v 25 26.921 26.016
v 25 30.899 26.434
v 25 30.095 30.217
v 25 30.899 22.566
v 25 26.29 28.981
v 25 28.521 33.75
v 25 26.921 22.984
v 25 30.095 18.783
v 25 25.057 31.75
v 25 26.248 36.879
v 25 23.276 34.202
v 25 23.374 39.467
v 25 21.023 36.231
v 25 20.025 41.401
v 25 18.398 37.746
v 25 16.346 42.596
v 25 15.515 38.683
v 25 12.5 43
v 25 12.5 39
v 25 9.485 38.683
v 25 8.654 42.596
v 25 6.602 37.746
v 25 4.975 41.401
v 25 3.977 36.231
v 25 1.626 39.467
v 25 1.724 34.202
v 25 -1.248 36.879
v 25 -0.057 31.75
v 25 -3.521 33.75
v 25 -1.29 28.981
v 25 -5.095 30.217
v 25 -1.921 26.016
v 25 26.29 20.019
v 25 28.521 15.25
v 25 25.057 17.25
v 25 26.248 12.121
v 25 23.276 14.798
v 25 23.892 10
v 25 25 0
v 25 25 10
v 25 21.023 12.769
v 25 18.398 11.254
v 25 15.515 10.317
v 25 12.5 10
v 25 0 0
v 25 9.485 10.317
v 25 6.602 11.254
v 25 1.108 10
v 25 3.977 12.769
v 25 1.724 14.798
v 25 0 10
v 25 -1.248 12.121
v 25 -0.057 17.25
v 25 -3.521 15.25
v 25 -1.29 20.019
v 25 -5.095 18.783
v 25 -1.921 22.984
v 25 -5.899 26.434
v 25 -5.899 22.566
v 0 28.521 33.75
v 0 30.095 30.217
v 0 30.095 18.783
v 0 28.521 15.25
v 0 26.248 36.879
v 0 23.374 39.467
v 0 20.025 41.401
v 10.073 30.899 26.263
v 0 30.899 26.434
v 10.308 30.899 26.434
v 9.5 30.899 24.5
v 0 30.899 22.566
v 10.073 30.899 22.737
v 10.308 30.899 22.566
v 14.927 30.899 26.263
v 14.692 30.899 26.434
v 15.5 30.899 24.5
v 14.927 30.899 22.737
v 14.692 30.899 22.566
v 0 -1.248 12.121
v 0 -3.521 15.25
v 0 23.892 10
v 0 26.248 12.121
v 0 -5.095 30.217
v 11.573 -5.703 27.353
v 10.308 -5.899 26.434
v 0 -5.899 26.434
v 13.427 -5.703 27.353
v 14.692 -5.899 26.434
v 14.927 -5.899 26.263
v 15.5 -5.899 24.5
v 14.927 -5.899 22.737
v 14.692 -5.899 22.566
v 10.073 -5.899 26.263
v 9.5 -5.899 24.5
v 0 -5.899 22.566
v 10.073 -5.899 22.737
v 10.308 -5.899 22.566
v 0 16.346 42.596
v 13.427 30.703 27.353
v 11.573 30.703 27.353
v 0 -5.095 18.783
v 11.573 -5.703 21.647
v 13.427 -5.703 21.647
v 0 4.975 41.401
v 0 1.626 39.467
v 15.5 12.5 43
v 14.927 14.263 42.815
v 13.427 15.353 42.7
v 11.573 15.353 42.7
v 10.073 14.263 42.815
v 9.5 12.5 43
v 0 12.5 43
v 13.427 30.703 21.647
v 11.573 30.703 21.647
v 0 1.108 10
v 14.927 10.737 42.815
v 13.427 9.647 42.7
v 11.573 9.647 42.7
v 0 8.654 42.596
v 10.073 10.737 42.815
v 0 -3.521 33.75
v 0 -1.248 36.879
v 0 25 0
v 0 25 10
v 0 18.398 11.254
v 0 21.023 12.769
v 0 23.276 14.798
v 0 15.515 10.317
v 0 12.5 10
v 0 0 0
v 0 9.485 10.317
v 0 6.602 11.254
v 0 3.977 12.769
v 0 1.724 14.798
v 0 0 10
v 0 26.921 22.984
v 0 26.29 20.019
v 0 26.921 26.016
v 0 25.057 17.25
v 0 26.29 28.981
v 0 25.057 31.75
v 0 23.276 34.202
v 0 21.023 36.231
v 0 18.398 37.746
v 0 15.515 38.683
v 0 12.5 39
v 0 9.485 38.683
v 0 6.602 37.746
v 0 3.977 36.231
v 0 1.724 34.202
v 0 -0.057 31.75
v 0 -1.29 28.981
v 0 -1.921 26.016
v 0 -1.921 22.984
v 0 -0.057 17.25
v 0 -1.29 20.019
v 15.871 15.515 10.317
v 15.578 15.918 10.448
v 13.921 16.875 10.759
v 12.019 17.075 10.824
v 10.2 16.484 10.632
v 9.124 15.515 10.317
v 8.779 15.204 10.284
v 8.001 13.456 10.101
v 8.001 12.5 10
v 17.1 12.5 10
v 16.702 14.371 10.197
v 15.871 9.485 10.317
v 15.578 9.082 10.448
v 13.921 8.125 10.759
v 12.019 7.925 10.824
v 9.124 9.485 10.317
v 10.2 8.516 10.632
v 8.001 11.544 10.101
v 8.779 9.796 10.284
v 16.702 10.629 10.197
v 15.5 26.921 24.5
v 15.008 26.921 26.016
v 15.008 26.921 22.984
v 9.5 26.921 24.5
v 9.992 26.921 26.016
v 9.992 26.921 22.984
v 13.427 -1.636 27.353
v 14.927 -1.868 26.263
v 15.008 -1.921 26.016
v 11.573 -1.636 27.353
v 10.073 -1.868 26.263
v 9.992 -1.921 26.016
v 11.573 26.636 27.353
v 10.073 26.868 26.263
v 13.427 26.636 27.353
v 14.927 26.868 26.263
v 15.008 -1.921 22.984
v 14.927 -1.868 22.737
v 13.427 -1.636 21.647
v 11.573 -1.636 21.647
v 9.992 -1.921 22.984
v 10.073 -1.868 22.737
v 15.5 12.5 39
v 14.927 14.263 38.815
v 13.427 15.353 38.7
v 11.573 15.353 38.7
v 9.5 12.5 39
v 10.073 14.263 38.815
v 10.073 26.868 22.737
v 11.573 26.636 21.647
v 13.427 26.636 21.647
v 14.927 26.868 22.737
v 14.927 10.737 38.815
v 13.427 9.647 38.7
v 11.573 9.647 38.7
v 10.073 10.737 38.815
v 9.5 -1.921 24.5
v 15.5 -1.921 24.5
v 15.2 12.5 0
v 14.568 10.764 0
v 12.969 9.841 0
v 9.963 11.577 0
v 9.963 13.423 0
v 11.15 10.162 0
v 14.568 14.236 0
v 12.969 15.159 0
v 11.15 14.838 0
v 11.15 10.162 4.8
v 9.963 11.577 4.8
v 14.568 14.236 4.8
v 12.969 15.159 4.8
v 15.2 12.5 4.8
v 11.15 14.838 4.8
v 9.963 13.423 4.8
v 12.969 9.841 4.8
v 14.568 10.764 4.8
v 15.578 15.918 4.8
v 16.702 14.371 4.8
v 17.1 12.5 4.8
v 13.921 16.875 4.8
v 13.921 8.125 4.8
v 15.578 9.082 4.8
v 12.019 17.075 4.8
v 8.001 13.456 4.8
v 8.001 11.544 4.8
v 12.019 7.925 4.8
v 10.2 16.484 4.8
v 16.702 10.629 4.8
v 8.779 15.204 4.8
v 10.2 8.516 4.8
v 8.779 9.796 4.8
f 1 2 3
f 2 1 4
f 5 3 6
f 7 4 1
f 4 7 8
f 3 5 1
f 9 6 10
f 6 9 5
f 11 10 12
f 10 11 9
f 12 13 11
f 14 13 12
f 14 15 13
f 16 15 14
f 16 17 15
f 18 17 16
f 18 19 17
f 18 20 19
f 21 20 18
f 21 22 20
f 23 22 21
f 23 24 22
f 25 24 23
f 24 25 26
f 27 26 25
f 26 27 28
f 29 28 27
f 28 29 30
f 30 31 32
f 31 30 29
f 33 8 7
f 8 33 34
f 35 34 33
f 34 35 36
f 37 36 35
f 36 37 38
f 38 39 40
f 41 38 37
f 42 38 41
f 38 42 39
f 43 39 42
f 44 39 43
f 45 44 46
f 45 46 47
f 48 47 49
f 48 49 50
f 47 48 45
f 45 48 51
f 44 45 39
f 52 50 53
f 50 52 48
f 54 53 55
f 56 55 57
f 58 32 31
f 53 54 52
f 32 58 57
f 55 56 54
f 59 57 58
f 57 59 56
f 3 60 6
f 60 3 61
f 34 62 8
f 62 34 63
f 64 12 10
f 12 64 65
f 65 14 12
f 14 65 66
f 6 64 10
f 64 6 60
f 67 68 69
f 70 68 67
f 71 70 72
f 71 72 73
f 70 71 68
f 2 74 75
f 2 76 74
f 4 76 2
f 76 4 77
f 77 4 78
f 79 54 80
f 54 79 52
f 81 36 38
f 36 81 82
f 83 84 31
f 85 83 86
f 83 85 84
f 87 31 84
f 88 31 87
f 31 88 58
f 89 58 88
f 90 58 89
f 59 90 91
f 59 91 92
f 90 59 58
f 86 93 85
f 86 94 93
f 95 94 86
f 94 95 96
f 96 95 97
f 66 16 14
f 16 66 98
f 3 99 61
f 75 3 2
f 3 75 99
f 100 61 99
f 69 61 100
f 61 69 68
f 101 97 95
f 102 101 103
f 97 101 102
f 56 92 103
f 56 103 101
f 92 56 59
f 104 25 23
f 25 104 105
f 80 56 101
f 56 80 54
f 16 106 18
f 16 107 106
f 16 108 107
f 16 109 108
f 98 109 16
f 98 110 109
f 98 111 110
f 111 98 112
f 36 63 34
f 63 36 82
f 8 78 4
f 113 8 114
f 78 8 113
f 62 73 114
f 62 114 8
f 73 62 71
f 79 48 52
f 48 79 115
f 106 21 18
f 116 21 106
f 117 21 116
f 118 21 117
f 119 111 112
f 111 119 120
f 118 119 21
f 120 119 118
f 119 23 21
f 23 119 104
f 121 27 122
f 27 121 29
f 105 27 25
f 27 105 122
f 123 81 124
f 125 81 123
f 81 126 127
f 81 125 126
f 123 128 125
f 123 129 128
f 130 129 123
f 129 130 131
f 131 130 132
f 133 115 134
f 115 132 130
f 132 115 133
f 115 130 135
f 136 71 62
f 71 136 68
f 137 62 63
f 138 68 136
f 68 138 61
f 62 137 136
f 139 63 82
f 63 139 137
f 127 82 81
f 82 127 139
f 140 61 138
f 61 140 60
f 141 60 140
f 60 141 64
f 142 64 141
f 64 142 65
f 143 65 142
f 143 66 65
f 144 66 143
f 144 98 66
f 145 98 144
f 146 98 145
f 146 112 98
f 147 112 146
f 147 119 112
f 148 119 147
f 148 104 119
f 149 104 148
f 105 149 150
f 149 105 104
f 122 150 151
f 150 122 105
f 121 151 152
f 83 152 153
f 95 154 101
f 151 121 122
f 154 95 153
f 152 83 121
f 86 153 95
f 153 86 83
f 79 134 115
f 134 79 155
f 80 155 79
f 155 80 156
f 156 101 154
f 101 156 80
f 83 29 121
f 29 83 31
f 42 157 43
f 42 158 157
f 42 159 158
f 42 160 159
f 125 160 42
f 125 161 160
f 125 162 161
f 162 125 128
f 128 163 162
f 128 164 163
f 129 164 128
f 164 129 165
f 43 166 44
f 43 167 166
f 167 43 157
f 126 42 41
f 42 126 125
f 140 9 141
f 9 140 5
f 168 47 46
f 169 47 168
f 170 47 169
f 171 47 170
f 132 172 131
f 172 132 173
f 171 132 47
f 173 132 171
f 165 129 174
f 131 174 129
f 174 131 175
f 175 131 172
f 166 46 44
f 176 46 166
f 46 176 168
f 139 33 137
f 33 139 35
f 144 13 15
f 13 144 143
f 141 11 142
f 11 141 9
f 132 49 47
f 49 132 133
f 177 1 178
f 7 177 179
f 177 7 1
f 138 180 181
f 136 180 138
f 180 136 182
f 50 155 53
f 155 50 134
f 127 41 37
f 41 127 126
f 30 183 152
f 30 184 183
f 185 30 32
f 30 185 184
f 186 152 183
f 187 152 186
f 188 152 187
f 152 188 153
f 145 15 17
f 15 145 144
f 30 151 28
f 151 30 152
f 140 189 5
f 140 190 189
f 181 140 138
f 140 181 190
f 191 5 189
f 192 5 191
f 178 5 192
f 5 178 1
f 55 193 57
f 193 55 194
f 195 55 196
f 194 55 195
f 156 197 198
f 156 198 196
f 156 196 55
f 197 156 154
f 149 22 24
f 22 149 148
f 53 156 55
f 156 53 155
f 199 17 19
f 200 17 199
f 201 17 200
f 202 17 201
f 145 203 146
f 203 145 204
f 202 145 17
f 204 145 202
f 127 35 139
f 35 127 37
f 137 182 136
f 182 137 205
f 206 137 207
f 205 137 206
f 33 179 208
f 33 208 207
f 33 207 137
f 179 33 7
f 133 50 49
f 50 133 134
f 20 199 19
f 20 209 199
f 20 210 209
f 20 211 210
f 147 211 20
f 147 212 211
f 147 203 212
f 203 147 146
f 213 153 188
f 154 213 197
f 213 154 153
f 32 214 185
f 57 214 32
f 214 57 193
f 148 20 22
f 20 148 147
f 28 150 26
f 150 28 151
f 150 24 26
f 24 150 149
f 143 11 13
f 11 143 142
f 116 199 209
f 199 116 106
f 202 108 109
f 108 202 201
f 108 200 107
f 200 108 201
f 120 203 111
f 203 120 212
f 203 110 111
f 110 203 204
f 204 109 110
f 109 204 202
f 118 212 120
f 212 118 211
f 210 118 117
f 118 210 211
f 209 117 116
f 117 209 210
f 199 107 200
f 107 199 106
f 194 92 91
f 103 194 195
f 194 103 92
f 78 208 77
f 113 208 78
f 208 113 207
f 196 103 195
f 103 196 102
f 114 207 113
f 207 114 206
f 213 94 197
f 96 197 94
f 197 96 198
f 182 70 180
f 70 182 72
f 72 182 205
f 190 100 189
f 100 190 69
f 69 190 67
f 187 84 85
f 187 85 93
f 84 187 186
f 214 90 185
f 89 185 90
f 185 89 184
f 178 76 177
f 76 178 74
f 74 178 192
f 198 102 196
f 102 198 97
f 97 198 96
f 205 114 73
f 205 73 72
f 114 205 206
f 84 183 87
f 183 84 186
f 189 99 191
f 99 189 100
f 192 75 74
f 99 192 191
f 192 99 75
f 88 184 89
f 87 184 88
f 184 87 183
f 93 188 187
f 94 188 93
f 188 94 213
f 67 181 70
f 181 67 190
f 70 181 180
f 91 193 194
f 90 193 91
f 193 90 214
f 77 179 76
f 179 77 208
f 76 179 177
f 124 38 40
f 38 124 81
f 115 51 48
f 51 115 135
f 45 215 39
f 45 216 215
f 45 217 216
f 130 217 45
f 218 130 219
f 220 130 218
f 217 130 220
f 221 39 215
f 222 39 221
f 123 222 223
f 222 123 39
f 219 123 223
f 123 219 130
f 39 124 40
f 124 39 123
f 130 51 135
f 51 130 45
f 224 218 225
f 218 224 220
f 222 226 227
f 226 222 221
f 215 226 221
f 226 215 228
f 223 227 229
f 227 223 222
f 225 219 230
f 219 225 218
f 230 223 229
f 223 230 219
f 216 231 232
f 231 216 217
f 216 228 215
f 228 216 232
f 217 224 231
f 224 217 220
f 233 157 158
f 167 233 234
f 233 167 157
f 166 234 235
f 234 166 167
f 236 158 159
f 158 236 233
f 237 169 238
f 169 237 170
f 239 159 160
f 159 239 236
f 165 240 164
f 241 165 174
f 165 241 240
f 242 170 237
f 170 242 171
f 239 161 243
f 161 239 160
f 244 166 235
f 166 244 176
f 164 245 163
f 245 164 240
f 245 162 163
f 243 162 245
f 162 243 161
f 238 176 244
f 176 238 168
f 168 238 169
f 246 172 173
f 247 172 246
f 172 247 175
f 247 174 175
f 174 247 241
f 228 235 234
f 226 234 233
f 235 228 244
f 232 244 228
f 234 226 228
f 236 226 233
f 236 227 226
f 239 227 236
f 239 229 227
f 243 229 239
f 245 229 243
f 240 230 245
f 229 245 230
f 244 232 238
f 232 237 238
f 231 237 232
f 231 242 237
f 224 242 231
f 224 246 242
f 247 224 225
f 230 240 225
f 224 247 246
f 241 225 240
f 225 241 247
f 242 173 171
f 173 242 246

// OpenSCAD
base=25;
hole=29;
depth=25;
wall_thickness=4;
base_thickness=10;
hold_diameter=6;

screw_head_diameter=9.2;
screw_head_height=5.2;

difference() {
union() {
translate([(0)/2,base/2,hole/2+base_thickness])
rotate([0,90,0]) 
difference() {
    cylinder(r=hole/2+wall_thickness,h=depth);
    cylinder(r=hole/2,h=depth);
    translate([-(hole)/2-wall_thickness,0,depth/2]) 
    rotate([0,90,0]) 
    cylinder(r=hold_diameter/2,h=hole+(wall_thickness*2));
    translate([0,hole/2+wall_thickness,depth/2]) 
    rotate([90,90,0]) 
    cylinder(r=hold_diameter/2,h=hole+(wall_thickness*2));
};

difference() {
    cube([base,base,base_thickness]);
    translate([base/2,base/2,0]) cylinder(r=5.4/2,h=base_thickness);
}
}
translate([base/2,base/2,base_thickness-screw_head_height]) cylinder(r=screw_head_diameter/2,h=screw_head_height+hole/2);
}
